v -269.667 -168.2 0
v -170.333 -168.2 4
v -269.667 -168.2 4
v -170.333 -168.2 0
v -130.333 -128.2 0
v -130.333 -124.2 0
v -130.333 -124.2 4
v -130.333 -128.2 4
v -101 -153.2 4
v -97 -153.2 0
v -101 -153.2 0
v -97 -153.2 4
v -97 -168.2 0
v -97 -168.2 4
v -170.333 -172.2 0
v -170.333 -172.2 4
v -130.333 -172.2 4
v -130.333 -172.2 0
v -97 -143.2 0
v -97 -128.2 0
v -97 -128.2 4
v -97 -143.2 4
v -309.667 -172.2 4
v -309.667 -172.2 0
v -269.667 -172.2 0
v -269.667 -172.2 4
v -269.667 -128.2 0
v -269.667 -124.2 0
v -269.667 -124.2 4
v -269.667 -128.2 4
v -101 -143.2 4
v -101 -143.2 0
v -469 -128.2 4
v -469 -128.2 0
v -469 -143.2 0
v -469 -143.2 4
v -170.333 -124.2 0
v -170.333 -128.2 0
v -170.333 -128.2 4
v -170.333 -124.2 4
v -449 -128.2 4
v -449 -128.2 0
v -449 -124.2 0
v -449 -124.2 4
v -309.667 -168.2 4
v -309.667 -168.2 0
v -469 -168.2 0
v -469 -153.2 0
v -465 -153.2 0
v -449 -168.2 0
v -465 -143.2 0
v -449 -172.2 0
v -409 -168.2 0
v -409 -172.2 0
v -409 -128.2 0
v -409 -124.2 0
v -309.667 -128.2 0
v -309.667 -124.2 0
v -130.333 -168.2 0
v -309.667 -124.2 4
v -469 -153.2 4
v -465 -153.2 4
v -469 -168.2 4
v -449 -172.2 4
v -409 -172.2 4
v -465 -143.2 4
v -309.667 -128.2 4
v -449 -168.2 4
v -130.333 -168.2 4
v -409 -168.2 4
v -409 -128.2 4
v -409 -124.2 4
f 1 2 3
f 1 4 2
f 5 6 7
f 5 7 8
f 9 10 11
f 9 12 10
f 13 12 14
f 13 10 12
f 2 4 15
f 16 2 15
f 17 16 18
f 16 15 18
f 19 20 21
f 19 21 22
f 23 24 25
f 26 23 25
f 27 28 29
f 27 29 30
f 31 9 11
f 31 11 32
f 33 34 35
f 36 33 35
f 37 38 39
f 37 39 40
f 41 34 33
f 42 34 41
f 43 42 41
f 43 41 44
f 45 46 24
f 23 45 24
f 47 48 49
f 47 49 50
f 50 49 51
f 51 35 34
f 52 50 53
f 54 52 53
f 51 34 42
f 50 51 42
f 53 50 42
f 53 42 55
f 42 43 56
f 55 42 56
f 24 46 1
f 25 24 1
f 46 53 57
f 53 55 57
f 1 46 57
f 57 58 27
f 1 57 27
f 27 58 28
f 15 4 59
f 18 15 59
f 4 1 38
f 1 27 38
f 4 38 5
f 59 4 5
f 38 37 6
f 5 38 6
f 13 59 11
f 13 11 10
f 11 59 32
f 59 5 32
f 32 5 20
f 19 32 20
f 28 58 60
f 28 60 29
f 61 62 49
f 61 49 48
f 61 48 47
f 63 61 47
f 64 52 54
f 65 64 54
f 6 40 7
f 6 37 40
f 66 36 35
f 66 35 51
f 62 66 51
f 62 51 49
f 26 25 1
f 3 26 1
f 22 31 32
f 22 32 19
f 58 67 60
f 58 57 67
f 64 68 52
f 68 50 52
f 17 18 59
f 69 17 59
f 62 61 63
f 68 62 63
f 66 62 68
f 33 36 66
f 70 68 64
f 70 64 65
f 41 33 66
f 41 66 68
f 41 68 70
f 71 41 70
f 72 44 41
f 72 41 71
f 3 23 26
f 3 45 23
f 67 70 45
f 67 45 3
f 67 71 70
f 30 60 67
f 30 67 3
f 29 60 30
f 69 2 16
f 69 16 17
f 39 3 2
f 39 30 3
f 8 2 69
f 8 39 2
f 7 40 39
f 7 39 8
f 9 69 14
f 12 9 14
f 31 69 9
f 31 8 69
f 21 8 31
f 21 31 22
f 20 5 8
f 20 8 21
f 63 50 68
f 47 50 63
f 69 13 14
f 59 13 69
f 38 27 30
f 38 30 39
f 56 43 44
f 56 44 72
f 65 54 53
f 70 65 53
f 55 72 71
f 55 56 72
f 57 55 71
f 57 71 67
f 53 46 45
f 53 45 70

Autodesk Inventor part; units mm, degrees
ref_plane "YZ Plane" through (0, 0, 0) normal (1, 0, 0) x (0, 1, 0)
ref_plane "XZ Plane" through (0, 0, 0) normal (0, 1, 0) x (-1, 0, 0)
sketch "Sketch2" plane through (0, 0, 0) normal (0, 0, 1) x (1, 0, 0)
  line L0 (-469, -128.2) -> (-449, -128.2)
  line L1 (-449, -128.2) -> (-449, -124.2)
  line L2 (-449, -124.2) -> (-409, -124.2)
  line L3 (-409, -124.2) -> (-409, -128.2)
  line L4 (-409, -128.2) -> (-309.6667, -128.2)
  line L5 (-309.6667, -128.2) -> (-309.6667, -124.2)
  line L6 (-309.6667, -124.2) -> (-269.6667, -124.2)
  line L7 (-269.6667, -124.2) -> (-269.6667, -128.2)
  line L8 (-269.6667, -128.2) -> (-170.3333, -128.2)
  line L9 (-170.3333, -128.2) -> (-170.3333, -124.2)
  line L10 (-170.3333, -124.2) -> (-130.3333, -124.2)
  line L11 (-130.3333, -124.2) -> (-130.3333, -128.2)
  line L12 (-130.3333, -128.2) -> (-101, -128.2)
  line L13 (-101, -128.2) -> (-97, -128.2)
  line L14 (-97, -128.2) -> (-97, -168.2)
  line L15 (-469, -128.2) -> (-469, -168.2)
  line L16 (-469, -148.2) -> (-513.1523, -148.2)
  line L17 (-170.3333, -168.2) -> (-170.3333, -172.2)
  line L18 (-309.6667, -168.2) -> (-309.6667, -172.2)
  line L19 (-130.3333, -172.2) -> (-130.3333, -168.2)
  line L20 (-449, -172.2) -> (-409, -172.2)
  line L21 (-449, -168.2) -> (-449, -172.2)
  line L22 (-409, -172.2) -> (-409, -168.2)
  line L23 (-269.6667, -172.2) -> (-269.6667, -168.2)
  line L24 (-309.6667, -172.2) -> (-269.6667, -172.2)
  line L25 (-170.3333, -172.2) -> (-130.3333, -172.2)
  line L26 (-449, -168.2) -> (-469, -168.2)
  line L27 (-309.6667, -168.2) -> (-409, -168.2)
  line L28 (-97, -168.2) -> (-130.3333, -168.2)
  line L29 (-170.3333, -168.2) -> (-269.6667, -168.2)
  point P0 (0, 0)
  dimension "d2" = 4
  dimension "d3" = 40
extrude "Extrusion2" add sketch "Sketch2" along normal blind 4
sketch "Sketch4" plane through (0, 0, 4) normal (0, 0, 1) x (1, 0, 0)
  line L0 (-170.3333, -128.2) -> (-269.6667, -128.2) projected
  line L1 (-269.6667, -128.2) -> (-269.6667, -124.2) projected
  line L2 (-269.6667, -124.2) -> (-309.6667, -124.2) projected
  line L3 (-309.6667, -124.2) -> (-309.6667, -128.2) projected
  line L4 (-309.6667, -128.2) -> (-409, -128.2) projected
  line L5 (-409, -128.2) -> (-409, -124.2) projected
  line L6 (-409, -124.2) -> (-449, -124.2) projected
  line L7 (-449, -124.2) -> (-449, -128.2) projected
  line L8 (-449, -128.2) -> (-469, -128.2) projected
  line L9 (-469, -128.2) -> (-469, -168.2) projected
  line L10 (-469, -168.2) -> (-449, -168.2) projected
  line L11 (-449, -168.2) -> (-449, -172.2) projected
  line L12 (-449, -172.2) -> (-409, -172.2) projected
  line L13 (-409, -172.2) -> (-409, -168.2) projected
  line L14 (-409, -168.2) -> (-309.6667, -168.2) projected
  line L15 (-309.6667, -168.2) -> (-309.6667, -172.2) projected
  line L16 (-309.6667, -172.2) -> (-269.6667, -172.2) projected
  line L17 (-269.6667, -172.2) -> (-269.6667, -168.2) projected
  line L18 (-269.6667, -168.2) -> (-170.3333, -168.2) projected
  line L19 (-170.3333, -168.2) -> (-170.3333, -172.2) projected
  line L20 (-170.3333, -172.2) -> (-130.3333, -172.2) projected
  line L21 (-130.3333, -172.2) -> (-130.3333, -168.2) projected
  line L22 (-130.3333, -168.2) -> (-97, -168.2) projected
  line L23 (-97, -168.2) -> (-97, -128.2) projected
  line L24 (-97, -128.2) -> (-130.3333, -128.2) projected
  line L25 (-130.3333, -128.2) -> (-130.3333, -124.2) projected
  line L26 (-130.3333, -124.2) -> (-170.3333, -124.2) projected
  line L27 (-170.3333, -124.2) -> (-170.3333, -128.2) projected
  line L28 (-469, -143.2) -> (-465, -143.2)
  line L29 (-465, -143.2) -> (-465, -153.2)
  line L30 (-465, -153.2) -> (-469, -153.2)
  line L31 (-469, -153.2) -> (-469, -143.2)
  line L32 (-469, -128.2) -> (-469, -168.2) projected
  point P0 (0, 0)
  point P1 (-469, -148.2)
  dimension "d13" = 4
  dimension "d14" = 10
  dimension "d17" = 40
  dimension "d18" = 15
extrude "Extrusion4" cut sketch "Sketch4" against normal blind 4 contours L28 L29 L30 L9
ref_plane "Work Plane1" through (-283, -128.2, 0) normal (-1, 0, 0) x (0, 0, 1)
mirror "Mirror1" about plane through (-283, -128.2, 0) normal (-1, 0, 0) of "Extrusion4"
properties part number "F6"
